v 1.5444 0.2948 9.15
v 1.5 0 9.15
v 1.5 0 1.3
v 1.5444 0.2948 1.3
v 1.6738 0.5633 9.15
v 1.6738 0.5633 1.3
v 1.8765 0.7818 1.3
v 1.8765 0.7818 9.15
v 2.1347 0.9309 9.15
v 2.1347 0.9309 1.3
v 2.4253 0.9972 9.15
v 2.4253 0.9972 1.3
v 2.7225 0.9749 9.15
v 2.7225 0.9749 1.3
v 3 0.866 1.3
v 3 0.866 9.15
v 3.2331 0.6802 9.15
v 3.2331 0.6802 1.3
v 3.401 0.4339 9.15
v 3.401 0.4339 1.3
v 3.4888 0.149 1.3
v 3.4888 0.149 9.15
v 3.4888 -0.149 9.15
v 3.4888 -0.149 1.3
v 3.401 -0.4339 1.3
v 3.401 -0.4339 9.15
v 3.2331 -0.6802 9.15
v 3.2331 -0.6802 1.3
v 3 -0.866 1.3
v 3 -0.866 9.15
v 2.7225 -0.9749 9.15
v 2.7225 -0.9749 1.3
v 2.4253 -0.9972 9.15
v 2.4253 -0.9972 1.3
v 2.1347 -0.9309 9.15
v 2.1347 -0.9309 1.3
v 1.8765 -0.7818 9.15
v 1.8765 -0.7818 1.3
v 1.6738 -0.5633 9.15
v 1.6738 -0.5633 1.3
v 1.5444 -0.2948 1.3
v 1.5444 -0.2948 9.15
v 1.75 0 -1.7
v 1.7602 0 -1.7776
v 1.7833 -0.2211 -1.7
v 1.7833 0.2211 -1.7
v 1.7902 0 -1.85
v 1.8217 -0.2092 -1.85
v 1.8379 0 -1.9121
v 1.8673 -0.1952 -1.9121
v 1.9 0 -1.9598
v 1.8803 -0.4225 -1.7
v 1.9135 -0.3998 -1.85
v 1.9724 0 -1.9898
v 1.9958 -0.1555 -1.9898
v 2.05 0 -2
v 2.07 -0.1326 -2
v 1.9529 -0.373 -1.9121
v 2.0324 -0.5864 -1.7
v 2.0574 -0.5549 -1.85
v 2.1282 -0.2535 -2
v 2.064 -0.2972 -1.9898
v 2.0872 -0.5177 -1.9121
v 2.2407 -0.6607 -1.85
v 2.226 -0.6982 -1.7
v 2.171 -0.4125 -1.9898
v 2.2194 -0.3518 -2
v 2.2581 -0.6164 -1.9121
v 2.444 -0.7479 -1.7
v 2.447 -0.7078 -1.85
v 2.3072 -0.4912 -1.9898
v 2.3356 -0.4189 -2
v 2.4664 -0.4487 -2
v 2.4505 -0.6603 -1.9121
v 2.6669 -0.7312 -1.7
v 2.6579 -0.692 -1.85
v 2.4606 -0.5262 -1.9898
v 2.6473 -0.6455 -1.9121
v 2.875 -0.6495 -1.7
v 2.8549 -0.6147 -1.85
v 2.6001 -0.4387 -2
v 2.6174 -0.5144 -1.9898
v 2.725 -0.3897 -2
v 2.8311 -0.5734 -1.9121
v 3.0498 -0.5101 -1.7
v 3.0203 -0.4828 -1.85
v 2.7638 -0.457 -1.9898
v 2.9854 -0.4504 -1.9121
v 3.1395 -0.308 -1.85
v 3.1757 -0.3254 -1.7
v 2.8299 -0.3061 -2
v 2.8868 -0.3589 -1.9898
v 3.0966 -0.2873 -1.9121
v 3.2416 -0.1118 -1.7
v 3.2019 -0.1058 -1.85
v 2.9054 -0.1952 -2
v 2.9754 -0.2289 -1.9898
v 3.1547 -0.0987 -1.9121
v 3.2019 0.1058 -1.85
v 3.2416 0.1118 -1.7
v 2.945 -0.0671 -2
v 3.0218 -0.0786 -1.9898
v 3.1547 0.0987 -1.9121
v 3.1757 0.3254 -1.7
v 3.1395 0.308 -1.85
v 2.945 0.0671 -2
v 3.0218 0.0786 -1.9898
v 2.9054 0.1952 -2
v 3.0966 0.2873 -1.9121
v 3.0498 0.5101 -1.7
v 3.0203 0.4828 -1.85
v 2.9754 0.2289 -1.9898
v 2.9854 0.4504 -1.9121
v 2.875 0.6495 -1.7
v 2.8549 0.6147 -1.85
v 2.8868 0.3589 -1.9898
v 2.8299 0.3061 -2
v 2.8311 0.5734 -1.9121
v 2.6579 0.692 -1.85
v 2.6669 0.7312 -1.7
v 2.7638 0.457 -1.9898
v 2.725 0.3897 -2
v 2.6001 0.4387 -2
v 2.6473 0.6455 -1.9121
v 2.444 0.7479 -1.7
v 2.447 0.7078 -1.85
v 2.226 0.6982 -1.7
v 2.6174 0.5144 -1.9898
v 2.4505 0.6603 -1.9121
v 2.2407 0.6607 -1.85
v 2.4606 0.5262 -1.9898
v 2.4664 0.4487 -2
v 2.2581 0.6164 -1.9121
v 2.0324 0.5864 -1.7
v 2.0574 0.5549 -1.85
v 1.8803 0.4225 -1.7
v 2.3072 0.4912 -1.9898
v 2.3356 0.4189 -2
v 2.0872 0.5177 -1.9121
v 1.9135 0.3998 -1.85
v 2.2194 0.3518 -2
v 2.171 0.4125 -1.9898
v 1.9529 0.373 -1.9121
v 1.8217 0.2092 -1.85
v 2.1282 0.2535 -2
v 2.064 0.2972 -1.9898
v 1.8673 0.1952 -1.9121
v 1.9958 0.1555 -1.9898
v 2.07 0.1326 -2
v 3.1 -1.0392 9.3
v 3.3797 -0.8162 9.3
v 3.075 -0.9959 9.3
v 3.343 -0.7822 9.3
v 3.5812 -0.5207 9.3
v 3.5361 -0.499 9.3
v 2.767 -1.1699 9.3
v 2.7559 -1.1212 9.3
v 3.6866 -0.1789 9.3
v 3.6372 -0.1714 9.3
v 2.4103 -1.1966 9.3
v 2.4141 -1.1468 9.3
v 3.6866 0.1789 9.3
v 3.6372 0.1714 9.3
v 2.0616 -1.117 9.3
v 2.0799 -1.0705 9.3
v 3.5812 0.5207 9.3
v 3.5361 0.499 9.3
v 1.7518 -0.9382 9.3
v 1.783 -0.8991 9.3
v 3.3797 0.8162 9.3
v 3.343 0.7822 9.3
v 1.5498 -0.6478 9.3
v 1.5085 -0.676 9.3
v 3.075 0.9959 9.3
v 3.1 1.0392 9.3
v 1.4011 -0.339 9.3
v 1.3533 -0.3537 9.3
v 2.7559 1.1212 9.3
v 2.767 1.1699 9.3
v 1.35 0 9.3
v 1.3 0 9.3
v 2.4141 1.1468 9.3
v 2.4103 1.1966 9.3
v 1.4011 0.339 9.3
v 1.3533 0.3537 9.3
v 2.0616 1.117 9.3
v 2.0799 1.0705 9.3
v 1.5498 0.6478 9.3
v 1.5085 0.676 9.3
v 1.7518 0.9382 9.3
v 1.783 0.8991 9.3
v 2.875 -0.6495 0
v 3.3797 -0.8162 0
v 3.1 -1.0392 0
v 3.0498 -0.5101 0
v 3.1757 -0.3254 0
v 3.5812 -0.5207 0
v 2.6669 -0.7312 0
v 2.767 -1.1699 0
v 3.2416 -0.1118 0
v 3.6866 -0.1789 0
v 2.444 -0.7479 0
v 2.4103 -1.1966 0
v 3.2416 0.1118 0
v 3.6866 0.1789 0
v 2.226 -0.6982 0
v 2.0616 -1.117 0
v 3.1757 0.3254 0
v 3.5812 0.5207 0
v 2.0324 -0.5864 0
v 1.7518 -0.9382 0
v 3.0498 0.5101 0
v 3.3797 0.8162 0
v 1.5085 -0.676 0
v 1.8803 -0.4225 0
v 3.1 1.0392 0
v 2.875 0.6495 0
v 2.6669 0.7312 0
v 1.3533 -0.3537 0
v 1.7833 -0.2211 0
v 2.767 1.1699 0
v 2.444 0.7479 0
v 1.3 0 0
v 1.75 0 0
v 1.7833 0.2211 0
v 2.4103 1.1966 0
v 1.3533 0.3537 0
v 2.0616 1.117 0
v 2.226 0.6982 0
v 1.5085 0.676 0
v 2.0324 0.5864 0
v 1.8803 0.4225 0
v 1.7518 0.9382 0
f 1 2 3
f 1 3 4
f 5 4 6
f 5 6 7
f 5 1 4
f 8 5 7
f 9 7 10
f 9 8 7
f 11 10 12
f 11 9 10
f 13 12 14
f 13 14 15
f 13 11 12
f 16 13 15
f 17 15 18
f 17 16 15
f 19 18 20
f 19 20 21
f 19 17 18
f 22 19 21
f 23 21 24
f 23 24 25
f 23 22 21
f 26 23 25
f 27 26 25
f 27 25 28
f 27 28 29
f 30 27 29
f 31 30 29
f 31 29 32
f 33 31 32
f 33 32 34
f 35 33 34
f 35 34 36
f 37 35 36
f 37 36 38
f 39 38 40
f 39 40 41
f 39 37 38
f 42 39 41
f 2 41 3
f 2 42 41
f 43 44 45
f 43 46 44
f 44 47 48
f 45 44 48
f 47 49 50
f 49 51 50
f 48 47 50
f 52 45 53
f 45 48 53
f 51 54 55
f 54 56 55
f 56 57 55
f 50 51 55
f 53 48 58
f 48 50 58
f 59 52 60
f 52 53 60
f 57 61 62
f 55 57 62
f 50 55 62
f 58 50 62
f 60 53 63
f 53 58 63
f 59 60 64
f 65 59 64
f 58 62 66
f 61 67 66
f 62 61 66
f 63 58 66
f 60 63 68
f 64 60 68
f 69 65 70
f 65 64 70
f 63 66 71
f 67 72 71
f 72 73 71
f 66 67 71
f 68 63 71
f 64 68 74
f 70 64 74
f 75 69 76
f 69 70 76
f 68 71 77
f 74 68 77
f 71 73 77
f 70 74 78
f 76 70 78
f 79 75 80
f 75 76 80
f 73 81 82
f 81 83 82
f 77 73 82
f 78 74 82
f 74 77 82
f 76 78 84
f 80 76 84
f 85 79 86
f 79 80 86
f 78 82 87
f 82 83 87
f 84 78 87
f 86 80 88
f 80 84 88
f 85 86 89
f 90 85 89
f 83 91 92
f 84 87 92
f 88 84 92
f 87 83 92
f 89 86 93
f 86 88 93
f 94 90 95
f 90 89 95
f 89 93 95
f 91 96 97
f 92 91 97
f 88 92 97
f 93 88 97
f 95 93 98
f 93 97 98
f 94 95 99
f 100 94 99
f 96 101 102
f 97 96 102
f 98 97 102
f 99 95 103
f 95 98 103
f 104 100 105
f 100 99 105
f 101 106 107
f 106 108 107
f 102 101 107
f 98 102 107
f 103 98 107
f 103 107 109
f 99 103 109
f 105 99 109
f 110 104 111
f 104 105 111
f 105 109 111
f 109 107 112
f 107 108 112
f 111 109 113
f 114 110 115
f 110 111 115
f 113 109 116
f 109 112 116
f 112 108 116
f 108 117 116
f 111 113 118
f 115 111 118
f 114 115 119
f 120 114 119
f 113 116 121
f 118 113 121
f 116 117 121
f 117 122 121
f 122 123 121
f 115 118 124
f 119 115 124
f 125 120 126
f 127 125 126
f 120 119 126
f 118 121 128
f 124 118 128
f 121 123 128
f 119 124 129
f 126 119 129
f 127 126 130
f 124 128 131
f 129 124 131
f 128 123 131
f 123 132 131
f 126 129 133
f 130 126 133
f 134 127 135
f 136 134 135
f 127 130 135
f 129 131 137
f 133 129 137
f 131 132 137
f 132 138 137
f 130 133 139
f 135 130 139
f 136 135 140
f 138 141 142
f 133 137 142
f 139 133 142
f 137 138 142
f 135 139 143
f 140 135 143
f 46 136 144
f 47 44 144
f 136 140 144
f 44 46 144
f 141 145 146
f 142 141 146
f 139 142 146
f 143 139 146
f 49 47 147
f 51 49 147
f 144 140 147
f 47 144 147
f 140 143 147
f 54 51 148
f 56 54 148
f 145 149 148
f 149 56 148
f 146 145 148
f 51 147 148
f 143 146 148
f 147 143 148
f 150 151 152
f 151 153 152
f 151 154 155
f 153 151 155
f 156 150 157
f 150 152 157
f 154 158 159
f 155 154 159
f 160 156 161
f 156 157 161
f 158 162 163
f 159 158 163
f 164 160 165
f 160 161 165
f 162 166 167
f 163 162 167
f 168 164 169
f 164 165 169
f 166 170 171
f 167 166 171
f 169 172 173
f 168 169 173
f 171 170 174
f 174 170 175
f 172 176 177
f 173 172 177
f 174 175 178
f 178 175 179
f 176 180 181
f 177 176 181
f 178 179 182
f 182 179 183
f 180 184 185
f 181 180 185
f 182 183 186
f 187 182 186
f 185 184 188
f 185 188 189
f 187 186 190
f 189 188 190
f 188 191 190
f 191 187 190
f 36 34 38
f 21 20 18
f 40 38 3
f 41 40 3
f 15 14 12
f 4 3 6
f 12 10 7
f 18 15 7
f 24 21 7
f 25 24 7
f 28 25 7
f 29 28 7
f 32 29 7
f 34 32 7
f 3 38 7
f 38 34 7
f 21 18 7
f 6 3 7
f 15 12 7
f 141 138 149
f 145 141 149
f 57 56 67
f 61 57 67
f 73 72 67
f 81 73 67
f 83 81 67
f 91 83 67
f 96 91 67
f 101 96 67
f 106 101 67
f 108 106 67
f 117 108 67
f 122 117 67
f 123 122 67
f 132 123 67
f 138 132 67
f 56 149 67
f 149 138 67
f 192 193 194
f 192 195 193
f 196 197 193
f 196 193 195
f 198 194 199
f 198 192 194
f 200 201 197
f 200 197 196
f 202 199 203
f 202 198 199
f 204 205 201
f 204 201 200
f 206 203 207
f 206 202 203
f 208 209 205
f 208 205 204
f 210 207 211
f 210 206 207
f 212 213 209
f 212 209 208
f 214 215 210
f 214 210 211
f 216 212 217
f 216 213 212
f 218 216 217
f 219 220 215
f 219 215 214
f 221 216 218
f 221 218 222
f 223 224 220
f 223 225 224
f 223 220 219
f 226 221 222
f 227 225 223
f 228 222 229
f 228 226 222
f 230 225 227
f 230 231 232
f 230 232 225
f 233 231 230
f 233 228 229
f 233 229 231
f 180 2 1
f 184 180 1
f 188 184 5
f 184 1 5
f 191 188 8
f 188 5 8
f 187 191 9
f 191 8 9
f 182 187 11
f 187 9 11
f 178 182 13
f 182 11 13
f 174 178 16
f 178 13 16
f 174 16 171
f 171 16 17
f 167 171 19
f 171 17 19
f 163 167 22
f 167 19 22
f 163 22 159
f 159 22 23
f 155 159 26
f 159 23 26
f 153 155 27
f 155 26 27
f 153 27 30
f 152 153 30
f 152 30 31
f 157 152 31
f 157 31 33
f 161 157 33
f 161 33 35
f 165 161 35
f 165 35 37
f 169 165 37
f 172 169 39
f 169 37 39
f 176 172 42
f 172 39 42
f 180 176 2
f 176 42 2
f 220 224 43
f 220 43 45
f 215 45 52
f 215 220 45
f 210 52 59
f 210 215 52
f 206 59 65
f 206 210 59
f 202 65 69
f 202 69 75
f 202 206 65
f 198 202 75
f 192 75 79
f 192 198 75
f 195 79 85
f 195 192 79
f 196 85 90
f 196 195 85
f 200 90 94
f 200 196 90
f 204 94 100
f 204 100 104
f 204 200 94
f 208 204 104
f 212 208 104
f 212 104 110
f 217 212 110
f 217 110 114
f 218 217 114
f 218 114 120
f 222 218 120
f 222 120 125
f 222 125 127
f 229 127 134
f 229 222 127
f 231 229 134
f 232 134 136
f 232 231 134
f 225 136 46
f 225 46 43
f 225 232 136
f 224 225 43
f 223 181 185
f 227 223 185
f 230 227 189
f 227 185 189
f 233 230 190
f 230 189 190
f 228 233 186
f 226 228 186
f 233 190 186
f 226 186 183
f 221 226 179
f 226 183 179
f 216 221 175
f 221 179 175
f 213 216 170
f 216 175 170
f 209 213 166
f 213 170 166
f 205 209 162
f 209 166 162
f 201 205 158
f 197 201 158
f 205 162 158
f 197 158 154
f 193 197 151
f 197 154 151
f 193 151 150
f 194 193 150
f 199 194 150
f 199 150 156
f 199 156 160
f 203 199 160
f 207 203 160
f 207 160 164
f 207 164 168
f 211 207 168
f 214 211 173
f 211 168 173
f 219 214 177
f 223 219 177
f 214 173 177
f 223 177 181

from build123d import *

# Parameters (mm, degrees)
SKETCH011_R      = 1
EXTRUDE013_DEPTH = 8
SKETCH009_R      = 1.2
EXTRUDE012_DEPTH = 9.3
CHAMFER001_SIZE  = 0.15
SKETCH012_R      = 0.75
EXTRUDE014_DEPTH = 2
FILLET011_R      = 0.3


with BuildPart() as extrude013:
    # Sketch011 → Extrude013 (new body)
    with BuildSketch(Plane.XY.offset(9.3)):
        with Locations((-2.5, 0)):
            Circle(SKETCH011_R)
    extrude(amount=-EXTRUDE013_DEPTH)


with BuildPart() as pinfemale002:
    # Sketch009 → Extrude012 (new body)
    with BuildSketch(Plane.XY.offset(9.6)):
        with Locations((-2.5, 0)):
            Circle(SKETCH009_R)
    extrude(amount=-EXTRUDE012_DEPTH)


with BuildPart() as pinfemale002_1:
    # Extrude012 placement: moved
    add(pinfemale002.part.moved(Location((0, 0, -0.3))))

    # Cut007: cut Extrude013
    add(extrude013.part, mode=Mode.SUBTRACT)

    # Chamfer001
    chamfer001_edges = [pinfemale002_1.edges().sort_by_distance(p)[0] for p in [
        (-3.5, 0, 9.3),
    ]]
    chamfer(chamfer001_edges, length=CHAMFER001_SIZE)


with BuildPart() as pinfemale003:
    # Sketch012 → Extrude014 (new body)
    with BuildSketch(Plane(origin=(0, 0, 0), x_dir=(1, 0, 0), z_dir=(0, 0, -1))):
        with Locations((-2.5, 0)):
            Circle(SKETCH012_R)
    extrude(amount=EXTRUDE014_DEPTH)

    # Fillet011
    fillet011_edges = [pinfemale003.edges().sort_by_distance(p)[0] for p in [
        (-3.25, 0, -2),
    ]]
    fillet(fillet011_edges, radius=FILLET011_R)

    # Fusion006: union pinFemale002
    add(pinfemale002_1.part)


with BuildPart() as part_mirroring004:
    # Part__Mirroring004: instance of pinFemale003
    add(pinfemale003.part.mirror(Plane(origin=(0, 0, 0), x_dir=(0, -1, 0), z_dir=(1, 0, 0))))


solid = part_mirroring004.part
